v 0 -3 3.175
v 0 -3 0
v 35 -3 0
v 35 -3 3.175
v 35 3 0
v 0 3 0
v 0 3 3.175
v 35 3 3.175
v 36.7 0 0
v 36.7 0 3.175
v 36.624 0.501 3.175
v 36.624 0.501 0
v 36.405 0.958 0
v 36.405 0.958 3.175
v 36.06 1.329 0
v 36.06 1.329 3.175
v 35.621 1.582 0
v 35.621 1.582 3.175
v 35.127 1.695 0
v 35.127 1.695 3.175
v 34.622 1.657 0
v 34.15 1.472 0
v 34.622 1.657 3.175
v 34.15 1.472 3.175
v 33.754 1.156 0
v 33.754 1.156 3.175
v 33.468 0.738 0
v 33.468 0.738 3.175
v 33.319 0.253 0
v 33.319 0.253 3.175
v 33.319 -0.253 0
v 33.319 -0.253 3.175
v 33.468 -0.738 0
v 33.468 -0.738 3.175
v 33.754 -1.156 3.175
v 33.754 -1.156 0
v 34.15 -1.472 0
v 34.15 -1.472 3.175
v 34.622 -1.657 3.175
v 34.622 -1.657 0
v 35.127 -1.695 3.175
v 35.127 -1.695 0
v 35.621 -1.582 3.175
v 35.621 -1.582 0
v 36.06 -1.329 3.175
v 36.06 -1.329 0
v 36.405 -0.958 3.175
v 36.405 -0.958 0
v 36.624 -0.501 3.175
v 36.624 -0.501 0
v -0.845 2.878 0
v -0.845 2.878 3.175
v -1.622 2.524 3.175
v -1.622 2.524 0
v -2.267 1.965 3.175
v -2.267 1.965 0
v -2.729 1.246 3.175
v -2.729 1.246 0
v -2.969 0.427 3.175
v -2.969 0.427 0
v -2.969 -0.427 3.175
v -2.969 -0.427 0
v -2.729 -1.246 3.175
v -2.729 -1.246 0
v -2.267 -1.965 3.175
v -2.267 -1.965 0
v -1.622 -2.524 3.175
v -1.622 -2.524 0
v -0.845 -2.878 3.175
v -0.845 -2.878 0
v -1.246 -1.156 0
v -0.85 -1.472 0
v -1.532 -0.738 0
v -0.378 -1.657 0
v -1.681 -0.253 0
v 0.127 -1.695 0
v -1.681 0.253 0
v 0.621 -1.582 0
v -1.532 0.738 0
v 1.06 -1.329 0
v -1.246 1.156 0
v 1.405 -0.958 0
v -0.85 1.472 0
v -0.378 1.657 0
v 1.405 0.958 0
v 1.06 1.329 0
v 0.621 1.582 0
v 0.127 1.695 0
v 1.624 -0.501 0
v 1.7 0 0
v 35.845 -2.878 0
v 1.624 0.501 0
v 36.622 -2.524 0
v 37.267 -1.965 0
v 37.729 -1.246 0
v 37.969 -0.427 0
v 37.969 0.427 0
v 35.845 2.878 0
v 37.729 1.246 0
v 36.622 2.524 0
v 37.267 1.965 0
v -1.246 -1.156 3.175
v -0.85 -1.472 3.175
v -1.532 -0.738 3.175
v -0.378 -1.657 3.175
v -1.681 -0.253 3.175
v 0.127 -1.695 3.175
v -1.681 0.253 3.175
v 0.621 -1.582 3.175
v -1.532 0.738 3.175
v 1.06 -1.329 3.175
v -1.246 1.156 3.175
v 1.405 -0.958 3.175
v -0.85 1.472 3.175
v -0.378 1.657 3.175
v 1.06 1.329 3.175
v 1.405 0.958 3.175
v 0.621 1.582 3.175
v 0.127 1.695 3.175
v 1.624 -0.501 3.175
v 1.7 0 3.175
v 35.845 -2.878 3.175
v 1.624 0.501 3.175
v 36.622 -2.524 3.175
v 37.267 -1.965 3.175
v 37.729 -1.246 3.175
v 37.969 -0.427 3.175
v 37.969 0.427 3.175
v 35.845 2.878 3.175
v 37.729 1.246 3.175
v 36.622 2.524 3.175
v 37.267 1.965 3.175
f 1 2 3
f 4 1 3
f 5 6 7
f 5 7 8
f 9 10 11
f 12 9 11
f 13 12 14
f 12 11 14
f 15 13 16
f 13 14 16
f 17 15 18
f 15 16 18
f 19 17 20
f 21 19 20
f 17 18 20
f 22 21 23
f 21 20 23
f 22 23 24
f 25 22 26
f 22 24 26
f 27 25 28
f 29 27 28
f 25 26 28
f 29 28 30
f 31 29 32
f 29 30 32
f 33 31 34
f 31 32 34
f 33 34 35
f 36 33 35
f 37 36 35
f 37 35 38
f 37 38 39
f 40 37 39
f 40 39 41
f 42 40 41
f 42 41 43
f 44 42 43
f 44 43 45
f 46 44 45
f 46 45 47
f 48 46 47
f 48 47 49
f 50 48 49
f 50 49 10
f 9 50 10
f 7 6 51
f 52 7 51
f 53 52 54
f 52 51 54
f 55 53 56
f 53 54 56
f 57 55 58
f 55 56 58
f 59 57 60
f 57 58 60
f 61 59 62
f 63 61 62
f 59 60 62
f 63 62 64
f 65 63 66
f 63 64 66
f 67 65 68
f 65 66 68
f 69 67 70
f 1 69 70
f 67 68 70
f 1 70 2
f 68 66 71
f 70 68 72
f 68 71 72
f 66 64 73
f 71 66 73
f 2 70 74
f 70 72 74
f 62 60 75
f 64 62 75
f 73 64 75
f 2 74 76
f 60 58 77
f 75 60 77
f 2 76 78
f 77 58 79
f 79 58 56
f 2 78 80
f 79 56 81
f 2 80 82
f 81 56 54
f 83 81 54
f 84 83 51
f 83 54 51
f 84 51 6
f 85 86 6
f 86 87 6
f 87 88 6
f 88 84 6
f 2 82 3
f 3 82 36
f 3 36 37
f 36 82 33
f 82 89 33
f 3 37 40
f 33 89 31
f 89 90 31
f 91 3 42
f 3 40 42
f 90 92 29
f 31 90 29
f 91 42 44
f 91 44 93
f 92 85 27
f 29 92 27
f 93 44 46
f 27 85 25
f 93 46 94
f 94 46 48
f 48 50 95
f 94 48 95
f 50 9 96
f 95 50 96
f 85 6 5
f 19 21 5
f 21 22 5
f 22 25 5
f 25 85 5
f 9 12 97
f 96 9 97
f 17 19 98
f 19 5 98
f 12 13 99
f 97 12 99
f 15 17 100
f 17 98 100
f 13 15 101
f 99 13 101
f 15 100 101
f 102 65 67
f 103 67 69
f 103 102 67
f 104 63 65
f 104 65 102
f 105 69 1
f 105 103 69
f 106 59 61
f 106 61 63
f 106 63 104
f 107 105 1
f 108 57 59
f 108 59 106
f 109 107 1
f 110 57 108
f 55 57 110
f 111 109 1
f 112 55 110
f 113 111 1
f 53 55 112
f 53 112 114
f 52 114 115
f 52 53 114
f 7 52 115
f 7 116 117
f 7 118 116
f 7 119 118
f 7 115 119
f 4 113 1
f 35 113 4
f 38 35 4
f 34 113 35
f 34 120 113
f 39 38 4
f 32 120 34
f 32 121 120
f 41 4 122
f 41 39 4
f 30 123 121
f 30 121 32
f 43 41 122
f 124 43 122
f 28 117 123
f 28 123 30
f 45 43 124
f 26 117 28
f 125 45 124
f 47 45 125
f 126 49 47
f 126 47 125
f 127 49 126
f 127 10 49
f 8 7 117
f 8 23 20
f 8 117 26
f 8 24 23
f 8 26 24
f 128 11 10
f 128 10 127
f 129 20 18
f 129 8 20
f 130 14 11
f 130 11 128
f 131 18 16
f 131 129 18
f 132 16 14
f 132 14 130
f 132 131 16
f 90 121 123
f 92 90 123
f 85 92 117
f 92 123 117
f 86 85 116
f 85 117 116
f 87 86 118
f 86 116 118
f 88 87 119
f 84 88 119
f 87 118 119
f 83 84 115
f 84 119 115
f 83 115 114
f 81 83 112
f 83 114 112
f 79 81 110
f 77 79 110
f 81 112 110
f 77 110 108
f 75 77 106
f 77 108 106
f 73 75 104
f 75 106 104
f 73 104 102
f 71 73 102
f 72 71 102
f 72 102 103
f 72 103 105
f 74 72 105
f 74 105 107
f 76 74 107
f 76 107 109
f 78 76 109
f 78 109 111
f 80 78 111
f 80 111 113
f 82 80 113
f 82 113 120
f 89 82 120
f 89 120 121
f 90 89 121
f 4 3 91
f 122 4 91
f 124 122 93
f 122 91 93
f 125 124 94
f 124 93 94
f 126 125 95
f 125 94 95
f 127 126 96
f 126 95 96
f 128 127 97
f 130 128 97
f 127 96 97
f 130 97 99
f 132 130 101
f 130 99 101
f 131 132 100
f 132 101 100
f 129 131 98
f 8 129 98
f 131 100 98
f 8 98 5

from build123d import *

# Parameters (mm, degrees)
PAD_DEPTH   = 3.175
SKETCH001_R = 1.7
HOLE_DEPTH  = 3.176


with BuildPart() as part:
    # Sketch → Pad (new body)
    with BuildSketch(Plane.XY):
        with BuildLine():
            ThreePointArc((0, 3), (-3, 0), (0, -3))
            Line((0, -3), (35, -3))
            ThreePointArc((35, -3), (38, 0), (35, 3))
            Line((0, 3), (35, 3))
        make_face()
    extrude(amount=PAD_DEPTH)

    # Sketch001 (on Face6 of Pad) → Hole (cut, through all)
    with BuildSketch(Plane.XY.offset(3.175)):
        Circle(SKETCH001_R)
        with Locations((35, 0)):
            Circle(SKETCH001_R)
    extrude(amount=-HOLE_DEPTH, mode=Mode.SUBTRACT)


solid = part.part
